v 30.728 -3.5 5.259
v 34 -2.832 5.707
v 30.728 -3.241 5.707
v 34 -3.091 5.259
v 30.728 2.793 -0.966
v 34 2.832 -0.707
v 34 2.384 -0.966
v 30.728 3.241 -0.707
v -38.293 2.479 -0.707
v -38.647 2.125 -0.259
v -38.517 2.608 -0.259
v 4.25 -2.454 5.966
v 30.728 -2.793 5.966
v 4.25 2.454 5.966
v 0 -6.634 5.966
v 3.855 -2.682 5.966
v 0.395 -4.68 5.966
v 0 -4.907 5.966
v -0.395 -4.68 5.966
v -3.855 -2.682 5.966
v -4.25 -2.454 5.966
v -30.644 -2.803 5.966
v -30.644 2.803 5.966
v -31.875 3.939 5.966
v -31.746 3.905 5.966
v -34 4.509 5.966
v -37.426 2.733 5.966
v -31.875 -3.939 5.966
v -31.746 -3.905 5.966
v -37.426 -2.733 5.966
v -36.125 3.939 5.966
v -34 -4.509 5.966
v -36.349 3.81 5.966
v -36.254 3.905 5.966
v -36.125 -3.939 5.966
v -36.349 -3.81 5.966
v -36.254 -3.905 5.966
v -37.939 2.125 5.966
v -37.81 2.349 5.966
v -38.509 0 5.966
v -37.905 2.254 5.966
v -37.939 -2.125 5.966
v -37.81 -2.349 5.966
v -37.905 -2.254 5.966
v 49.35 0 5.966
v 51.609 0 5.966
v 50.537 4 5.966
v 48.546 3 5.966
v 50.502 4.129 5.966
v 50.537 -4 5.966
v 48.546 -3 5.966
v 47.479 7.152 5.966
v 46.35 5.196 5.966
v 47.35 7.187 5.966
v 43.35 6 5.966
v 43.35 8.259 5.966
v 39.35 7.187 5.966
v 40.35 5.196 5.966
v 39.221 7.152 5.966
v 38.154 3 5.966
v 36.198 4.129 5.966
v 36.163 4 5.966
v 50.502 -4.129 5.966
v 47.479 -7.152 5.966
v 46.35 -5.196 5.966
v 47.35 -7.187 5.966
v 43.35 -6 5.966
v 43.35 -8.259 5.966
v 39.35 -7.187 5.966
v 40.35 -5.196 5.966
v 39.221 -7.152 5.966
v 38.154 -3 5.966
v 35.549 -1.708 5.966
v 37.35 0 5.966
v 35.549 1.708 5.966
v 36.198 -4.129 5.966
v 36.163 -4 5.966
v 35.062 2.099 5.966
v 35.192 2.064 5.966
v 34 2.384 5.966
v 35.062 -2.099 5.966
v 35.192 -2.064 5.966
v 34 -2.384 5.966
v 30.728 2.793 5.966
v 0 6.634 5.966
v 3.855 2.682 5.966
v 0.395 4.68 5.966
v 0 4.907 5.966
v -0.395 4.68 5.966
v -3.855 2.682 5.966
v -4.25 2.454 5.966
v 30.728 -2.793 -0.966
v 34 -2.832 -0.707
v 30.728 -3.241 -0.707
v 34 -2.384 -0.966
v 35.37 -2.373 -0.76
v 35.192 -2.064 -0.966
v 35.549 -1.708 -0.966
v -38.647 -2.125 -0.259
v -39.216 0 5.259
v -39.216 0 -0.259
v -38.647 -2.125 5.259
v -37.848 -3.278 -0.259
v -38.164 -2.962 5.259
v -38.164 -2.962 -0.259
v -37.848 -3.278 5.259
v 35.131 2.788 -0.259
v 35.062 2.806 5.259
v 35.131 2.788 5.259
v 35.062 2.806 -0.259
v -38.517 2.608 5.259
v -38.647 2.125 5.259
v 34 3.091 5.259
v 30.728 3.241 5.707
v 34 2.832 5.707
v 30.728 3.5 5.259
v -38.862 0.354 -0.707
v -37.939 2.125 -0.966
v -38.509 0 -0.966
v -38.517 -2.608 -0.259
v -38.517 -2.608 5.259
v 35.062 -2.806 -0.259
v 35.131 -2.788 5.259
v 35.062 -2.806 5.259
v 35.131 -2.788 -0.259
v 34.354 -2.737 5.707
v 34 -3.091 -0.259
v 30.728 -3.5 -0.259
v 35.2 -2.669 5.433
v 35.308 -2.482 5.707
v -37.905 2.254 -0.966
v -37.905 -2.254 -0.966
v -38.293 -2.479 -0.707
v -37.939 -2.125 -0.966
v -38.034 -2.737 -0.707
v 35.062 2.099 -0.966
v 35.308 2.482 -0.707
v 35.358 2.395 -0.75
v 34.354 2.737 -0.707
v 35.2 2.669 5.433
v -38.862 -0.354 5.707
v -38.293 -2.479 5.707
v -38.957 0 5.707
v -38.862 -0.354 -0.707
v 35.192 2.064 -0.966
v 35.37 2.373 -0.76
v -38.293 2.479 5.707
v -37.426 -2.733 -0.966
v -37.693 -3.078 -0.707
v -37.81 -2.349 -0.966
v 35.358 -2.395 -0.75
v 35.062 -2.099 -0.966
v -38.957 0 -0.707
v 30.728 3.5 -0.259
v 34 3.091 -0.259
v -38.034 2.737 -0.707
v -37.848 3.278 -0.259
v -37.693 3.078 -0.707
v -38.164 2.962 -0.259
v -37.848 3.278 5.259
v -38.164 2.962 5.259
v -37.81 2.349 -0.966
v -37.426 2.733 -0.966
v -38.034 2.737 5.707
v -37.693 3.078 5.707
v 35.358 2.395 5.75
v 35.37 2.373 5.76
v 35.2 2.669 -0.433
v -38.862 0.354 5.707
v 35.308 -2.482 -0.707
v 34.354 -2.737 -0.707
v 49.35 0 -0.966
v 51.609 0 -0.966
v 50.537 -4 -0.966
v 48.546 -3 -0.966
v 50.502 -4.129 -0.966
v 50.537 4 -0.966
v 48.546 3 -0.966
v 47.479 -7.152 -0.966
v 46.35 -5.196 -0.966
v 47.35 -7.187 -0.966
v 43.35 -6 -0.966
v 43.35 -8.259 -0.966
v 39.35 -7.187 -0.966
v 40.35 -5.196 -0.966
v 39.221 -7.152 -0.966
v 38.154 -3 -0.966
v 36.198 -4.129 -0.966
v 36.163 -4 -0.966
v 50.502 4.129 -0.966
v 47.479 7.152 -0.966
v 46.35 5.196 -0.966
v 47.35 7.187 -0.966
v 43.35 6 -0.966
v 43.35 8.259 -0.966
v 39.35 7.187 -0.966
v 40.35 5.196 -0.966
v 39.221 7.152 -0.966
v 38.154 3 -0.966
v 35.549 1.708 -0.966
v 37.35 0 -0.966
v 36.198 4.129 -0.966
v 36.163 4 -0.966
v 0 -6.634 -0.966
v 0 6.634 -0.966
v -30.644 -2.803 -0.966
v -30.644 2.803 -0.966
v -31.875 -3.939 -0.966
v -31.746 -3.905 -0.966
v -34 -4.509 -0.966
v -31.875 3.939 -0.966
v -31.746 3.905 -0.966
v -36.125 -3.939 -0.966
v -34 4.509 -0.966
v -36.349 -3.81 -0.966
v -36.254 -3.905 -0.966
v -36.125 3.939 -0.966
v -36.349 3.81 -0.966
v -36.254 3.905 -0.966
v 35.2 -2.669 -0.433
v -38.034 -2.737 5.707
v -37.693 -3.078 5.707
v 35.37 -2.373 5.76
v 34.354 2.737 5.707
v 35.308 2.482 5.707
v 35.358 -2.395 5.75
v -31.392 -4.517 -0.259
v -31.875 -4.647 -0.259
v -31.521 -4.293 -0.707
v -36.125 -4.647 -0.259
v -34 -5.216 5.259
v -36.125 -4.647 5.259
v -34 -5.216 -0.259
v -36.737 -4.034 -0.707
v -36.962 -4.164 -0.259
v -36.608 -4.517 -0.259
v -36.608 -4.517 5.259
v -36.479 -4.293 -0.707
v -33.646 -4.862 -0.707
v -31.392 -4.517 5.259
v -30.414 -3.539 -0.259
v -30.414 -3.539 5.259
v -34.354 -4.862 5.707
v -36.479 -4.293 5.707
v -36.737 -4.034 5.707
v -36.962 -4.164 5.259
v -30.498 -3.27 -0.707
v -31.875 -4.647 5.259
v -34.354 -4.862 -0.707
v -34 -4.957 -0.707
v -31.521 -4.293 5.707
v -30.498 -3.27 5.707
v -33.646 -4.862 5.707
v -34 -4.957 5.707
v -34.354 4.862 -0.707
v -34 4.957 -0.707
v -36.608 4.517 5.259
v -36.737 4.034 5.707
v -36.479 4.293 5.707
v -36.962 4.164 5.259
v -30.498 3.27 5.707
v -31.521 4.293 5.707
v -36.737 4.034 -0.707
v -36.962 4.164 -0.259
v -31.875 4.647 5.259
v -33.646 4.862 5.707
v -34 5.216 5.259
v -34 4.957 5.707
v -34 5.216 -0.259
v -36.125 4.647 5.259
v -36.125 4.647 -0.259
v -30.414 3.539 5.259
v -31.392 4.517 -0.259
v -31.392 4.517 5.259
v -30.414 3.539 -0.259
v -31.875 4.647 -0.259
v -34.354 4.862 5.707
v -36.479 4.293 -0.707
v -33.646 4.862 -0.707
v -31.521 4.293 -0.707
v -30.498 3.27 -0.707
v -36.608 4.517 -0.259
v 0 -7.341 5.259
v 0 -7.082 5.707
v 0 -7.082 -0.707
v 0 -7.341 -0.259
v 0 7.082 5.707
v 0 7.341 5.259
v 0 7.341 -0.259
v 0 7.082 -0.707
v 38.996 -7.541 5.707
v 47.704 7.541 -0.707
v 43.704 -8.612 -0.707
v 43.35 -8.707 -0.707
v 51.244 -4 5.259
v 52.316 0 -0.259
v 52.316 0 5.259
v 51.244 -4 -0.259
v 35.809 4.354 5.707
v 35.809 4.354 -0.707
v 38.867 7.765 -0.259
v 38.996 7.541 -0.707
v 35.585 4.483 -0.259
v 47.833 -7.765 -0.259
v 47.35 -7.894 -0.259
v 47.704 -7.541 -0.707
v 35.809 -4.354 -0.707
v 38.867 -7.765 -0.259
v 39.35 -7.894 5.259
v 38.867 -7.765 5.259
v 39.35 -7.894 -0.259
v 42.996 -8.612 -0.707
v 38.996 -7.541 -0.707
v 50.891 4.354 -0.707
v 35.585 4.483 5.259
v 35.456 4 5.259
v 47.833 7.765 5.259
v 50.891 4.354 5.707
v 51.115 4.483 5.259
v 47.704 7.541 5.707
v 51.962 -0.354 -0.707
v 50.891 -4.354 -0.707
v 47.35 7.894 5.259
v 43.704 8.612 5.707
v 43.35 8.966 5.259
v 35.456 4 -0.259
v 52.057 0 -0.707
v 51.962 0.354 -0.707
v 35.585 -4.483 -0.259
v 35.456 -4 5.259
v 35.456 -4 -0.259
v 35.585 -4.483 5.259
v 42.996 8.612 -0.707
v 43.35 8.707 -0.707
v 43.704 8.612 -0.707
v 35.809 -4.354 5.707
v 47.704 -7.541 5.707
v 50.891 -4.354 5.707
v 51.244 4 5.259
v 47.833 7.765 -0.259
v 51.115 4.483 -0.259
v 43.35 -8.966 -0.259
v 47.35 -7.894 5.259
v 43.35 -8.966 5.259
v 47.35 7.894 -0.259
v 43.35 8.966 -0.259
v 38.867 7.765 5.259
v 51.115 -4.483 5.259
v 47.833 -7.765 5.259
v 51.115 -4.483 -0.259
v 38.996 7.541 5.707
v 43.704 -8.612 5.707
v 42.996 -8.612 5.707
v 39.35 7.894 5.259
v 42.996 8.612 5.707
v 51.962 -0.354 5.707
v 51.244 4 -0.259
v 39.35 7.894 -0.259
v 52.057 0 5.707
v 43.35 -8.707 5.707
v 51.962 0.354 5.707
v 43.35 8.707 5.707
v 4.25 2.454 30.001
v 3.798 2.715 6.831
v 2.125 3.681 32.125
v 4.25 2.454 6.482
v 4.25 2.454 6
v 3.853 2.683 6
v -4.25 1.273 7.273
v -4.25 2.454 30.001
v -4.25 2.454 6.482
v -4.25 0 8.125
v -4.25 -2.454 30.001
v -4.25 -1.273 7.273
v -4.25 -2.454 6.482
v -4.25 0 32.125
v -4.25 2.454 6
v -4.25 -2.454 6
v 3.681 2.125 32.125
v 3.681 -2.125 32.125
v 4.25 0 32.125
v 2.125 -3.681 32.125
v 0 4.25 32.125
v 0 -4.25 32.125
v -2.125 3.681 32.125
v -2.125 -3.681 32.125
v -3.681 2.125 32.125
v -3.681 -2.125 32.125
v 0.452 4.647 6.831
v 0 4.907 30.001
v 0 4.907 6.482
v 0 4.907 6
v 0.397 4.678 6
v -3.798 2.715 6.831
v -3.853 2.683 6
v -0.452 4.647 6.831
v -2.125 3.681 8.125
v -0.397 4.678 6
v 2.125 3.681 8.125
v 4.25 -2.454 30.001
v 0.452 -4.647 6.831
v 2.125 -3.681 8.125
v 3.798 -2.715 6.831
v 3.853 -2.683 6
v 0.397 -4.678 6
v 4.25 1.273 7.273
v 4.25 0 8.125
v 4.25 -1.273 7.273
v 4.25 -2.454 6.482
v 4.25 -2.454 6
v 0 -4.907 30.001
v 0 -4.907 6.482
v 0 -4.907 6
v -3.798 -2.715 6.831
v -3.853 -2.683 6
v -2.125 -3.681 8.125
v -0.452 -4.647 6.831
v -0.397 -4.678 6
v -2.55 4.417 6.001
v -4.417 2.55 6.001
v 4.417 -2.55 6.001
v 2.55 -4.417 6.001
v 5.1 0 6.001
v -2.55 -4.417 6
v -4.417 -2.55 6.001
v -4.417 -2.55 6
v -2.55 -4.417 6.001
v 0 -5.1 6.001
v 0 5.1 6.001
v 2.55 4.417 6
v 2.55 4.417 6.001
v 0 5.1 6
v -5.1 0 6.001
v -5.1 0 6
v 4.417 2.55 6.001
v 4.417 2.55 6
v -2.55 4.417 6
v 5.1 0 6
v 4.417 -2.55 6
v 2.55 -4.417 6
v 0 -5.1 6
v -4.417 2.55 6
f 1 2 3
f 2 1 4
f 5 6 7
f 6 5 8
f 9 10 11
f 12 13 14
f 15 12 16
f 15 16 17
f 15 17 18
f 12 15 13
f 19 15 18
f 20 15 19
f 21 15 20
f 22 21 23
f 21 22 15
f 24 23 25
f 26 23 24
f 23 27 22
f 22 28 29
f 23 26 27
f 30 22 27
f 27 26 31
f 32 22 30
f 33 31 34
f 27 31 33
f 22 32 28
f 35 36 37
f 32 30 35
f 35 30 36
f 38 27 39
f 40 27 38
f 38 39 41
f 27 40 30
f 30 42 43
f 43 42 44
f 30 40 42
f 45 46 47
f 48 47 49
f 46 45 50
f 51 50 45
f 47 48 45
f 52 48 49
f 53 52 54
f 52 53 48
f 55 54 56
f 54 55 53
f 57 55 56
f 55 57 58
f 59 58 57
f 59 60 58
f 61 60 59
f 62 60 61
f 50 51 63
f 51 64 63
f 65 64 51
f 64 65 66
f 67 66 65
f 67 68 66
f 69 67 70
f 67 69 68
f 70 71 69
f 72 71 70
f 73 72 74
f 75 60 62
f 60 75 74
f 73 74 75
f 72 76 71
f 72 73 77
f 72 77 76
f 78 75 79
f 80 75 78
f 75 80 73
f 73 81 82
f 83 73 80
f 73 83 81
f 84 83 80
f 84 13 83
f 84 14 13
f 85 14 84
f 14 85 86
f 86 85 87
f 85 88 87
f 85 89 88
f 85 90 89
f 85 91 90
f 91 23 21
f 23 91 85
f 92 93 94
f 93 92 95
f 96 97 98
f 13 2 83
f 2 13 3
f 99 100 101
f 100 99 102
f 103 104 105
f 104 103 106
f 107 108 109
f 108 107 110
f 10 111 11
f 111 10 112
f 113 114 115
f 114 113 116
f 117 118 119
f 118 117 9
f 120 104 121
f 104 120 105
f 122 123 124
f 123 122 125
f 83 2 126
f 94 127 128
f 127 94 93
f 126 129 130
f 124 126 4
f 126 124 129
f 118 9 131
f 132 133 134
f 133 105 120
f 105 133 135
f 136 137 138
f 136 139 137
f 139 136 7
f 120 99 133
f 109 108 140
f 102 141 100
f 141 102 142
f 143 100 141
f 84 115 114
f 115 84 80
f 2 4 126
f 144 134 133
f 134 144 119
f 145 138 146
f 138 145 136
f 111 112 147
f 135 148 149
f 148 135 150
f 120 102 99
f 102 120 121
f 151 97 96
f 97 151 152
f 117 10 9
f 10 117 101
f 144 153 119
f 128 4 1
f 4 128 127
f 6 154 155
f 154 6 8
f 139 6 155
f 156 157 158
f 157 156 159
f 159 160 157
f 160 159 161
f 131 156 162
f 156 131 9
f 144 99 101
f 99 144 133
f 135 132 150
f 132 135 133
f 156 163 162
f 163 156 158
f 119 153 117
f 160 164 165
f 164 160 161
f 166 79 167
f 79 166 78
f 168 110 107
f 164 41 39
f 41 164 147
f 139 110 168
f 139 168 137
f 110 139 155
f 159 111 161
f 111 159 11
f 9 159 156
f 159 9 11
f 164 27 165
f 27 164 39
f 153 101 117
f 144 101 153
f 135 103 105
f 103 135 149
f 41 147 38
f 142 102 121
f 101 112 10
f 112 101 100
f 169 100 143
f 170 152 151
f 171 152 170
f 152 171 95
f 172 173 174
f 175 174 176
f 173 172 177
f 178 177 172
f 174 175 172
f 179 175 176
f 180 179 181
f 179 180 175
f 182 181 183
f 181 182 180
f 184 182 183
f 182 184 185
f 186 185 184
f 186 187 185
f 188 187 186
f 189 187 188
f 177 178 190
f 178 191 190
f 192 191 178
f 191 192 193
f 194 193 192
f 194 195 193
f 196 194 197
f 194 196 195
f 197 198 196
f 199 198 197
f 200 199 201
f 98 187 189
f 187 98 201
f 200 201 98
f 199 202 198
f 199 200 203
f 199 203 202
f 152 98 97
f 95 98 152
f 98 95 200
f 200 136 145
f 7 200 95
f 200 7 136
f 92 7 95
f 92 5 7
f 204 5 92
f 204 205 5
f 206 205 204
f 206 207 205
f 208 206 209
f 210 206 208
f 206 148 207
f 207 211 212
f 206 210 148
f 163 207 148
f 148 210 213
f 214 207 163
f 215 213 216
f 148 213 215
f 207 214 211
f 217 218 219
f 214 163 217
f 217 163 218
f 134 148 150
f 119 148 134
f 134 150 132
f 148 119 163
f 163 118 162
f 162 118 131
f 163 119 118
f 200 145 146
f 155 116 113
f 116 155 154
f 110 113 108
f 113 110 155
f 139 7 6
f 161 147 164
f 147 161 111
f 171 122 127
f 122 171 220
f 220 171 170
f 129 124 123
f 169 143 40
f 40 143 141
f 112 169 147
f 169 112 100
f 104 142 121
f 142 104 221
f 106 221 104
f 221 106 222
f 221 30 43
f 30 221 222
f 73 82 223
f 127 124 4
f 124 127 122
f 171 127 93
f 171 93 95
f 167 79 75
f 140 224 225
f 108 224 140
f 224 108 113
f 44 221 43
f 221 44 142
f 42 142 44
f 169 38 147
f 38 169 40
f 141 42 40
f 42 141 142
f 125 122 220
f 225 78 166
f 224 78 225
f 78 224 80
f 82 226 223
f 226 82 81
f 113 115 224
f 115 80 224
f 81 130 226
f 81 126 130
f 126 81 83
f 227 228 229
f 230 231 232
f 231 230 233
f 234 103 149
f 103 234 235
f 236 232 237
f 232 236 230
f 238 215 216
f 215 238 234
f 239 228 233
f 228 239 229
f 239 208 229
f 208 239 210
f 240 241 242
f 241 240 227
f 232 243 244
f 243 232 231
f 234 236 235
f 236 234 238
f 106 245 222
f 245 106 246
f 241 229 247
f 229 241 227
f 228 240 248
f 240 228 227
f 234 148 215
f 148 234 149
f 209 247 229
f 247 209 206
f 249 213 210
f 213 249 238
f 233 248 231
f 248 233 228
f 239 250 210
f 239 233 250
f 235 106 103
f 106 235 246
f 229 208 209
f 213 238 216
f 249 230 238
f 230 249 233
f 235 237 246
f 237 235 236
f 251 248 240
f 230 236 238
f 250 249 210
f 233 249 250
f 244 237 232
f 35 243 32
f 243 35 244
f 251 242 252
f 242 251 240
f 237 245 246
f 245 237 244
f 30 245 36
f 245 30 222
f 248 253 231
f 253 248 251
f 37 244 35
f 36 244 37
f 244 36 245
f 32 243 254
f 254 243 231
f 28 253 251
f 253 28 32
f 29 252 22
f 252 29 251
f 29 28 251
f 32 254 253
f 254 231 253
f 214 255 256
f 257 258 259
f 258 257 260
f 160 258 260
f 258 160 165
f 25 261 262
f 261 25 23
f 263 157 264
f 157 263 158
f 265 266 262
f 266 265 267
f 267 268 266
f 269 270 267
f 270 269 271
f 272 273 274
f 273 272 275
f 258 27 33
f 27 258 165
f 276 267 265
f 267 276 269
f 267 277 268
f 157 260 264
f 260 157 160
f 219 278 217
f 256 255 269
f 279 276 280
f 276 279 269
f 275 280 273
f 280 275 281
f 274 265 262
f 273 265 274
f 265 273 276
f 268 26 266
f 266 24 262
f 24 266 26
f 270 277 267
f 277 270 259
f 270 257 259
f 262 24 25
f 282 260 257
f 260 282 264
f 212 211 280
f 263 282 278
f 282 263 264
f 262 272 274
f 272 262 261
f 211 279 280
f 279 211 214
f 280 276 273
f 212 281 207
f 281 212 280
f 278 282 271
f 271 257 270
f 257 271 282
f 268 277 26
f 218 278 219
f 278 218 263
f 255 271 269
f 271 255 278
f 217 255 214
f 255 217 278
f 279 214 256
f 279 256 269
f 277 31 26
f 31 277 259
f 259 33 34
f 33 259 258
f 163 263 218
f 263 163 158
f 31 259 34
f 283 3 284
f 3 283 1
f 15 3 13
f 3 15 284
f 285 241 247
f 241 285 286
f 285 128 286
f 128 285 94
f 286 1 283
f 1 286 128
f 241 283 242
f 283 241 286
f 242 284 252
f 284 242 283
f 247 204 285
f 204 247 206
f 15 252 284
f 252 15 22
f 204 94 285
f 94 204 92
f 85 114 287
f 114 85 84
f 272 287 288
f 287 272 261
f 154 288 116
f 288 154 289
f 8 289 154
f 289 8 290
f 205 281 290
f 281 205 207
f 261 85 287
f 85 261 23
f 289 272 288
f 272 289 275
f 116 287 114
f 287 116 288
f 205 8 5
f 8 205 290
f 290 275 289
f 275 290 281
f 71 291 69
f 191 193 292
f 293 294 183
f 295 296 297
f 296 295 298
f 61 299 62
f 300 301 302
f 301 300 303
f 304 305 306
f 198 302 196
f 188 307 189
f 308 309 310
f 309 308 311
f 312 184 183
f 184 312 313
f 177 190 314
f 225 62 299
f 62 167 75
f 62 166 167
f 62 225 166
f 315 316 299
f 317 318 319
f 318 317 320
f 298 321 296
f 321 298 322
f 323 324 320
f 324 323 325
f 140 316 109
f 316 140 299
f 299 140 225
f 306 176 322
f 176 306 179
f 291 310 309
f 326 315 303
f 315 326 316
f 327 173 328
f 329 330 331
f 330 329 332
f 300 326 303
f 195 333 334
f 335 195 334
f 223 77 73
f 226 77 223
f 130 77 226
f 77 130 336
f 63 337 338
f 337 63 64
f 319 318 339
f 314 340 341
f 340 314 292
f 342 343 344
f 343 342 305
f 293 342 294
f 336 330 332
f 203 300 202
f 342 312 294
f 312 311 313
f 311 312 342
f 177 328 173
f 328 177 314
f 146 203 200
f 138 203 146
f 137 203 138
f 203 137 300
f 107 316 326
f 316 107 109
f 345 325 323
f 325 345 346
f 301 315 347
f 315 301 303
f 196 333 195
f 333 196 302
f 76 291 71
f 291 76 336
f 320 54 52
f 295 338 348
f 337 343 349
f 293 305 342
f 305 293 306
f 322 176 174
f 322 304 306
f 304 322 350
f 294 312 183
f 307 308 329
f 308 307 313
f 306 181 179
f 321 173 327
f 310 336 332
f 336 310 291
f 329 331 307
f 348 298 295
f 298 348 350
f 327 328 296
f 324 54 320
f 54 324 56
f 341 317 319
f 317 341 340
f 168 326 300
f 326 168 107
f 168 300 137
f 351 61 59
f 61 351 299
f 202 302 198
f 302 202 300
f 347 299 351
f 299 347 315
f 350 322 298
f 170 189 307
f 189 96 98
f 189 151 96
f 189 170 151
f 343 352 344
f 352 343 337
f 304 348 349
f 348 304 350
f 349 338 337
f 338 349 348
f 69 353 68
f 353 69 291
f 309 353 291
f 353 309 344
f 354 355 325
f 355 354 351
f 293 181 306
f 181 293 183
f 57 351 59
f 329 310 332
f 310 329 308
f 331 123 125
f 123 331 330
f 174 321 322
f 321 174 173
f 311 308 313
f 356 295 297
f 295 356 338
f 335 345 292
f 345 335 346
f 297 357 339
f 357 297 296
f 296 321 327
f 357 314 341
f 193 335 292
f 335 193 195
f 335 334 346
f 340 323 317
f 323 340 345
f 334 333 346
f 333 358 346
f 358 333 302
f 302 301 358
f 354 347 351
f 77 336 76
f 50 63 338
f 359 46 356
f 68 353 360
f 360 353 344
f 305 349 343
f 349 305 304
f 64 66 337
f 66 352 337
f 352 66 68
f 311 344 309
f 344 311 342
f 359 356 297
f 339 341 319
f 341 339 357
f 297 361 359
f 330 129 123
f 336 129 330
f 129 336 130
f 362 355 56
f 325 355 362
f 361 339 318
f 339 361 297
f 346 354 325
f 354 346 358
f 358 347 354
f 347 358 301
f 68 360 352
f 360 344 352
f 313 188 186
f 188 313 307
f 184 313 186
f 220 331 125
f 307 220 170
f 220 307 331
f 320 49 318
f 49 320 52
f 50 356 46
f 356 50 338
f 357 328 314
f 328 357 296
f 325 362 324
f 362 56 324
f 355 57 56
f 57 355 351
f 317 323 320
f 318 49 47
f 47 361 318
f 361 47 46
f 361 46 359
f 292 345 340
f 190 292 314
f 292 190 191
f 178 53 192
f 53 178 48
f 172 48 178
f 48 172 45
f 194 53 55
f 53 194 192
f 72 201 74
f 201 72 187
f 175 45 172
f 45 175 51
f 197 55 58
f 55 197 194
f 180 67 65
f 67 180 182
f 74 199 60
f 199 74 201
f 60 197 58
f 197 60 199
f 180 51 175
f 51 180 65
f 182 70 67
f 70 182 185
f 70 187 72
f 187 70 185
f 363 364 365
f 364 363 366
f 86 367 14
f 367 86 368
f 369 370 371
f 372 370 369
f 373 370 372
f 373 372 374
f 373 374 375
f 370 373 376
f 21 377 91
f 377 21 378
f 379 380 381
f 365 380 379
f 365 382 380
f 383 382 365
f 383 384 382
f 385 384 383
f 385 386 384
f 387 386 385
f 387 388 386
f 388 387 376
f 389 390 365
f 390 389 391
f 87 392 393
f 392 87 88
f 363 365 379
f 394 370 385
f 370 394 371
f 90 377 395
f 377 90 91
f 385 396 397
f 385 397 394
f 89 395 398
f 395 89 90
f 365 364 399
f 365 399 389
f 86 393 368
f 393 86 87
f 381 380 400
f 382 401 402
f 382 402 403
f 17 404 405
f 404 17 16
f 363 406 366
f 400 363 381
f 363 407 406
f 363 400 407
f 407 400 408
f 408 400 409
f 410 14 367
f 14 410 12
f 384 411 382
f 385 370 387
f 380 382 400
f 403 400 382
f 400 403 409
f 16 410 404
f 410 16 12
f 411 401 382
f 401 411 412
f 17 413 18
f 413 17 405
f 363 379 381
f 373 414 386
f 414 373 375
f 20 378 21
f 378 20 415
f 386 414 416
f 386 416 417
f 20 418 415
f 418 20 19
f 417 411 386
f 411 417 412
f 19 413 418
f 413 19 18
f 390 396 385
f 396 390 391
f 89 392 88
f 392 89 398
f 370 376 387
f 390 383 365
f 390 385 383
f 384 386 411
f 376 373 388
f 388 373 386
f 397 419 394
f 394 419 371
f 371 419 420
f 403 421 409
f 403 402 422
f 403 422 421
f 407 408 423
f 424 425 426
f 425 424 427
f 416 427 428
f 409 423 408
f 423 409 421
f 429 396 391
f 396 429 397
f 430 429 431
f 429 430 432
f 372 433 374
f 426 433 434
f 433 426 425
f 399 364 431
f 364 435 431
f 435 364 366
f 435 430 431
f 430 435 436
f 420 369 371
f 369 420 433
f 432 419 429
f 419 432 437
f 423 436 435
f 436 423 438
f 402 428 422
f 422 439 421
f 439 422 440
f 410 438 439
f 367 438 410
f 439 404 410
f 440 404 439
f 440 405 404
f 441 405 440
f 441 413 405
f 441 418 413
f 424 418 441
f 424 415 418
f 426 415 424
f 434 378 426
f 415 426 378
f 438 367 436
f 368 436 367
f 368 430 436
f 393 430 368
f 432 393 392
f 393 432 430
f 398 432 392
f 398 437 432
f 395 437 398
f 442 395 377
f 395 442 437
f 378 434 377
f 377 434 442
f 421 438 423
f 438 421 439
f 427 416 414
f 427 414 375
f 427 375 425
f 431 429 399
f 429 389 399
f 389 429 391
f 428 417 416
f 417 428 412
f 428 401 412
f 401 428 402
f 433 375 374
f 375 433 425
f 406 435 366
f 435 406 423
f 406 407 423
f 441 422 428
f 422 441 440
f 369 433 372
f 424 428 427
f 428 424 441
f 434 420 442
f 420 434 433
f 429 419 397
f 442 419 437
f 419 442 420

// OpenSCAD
hex_size = 8.5;
face_length = hex_size / sqrt(3);
post_height = 25;
handle_height = 5;
roundcorner = 2;

fn_upper = 200;
fn_lower = 12;

rc = false;
$fn = rc ? fn_upper : fn_lower;



hull() {
    translate([0, 0, ((post_height+handle_height) / 2) + 0.001]) {
        hull() {
            cube([hex_size, face_length, post_height + handle_height], center=true);
    
            rotate([0, 0, 120]) {
                cube([hex_size, face_length, post_height+handle_height], center=true);
            }
            rotate([0, 0, 240]) {
                cube([hex_size, face_length, post_height+handle_height], center=true);
            }
        }
    }
    translate([0, 0, post_height + handle_height]) {
        cylinder(h = (hex_size / 4), d = hex_size);
    }
        

}
hull() {
    translate([0, 0, handle_height +  + (roundcorner / 2)]) {
        cylinder(h = (hex_size / 4), d = hex_size);
    }
    translate([0, 0, handle_height + (roundcorner / 2)]) {
        cylinder(h = 0.001, d = hex_size * 1.2 );
    }
}




minkowski() {
        union() {
            hull() {
                cylinder(h = handle_height, d = hex_size * 1.5);
                translate([hex_size * 4, 0, 0]) {
                    cylinder(h = handle_height, d = hex_size * 1/2);
                }
                translate([hex_size * -4, 0, 0]) {
                    cylinder(h = handle_height, d = hex_size * 1/2);
                }

            }
           // translate([hex_size * 4, 0, 0]) {
            //    cylinder(h = handle_height, d = hex_size);
           // }
            translate([hex_size * -4, 0, 0]) {
                cylinder(h = handle_height, d = hex_size);
            }
        }
        
    sphere(r=roundcorner / 2);

}
  


translate([hex_size * 5.1, 0, 0]) {
    difference() {
        minkowski() {
            cylinder(h = handle_height, d = 16);
            sphere(r=roundcorner / 2);
        }
        translate([0, 0, -roundcorner]) {
            cylinder(h = handle_height + (roundcorner * 2), d=12);
        }
    }
}            
